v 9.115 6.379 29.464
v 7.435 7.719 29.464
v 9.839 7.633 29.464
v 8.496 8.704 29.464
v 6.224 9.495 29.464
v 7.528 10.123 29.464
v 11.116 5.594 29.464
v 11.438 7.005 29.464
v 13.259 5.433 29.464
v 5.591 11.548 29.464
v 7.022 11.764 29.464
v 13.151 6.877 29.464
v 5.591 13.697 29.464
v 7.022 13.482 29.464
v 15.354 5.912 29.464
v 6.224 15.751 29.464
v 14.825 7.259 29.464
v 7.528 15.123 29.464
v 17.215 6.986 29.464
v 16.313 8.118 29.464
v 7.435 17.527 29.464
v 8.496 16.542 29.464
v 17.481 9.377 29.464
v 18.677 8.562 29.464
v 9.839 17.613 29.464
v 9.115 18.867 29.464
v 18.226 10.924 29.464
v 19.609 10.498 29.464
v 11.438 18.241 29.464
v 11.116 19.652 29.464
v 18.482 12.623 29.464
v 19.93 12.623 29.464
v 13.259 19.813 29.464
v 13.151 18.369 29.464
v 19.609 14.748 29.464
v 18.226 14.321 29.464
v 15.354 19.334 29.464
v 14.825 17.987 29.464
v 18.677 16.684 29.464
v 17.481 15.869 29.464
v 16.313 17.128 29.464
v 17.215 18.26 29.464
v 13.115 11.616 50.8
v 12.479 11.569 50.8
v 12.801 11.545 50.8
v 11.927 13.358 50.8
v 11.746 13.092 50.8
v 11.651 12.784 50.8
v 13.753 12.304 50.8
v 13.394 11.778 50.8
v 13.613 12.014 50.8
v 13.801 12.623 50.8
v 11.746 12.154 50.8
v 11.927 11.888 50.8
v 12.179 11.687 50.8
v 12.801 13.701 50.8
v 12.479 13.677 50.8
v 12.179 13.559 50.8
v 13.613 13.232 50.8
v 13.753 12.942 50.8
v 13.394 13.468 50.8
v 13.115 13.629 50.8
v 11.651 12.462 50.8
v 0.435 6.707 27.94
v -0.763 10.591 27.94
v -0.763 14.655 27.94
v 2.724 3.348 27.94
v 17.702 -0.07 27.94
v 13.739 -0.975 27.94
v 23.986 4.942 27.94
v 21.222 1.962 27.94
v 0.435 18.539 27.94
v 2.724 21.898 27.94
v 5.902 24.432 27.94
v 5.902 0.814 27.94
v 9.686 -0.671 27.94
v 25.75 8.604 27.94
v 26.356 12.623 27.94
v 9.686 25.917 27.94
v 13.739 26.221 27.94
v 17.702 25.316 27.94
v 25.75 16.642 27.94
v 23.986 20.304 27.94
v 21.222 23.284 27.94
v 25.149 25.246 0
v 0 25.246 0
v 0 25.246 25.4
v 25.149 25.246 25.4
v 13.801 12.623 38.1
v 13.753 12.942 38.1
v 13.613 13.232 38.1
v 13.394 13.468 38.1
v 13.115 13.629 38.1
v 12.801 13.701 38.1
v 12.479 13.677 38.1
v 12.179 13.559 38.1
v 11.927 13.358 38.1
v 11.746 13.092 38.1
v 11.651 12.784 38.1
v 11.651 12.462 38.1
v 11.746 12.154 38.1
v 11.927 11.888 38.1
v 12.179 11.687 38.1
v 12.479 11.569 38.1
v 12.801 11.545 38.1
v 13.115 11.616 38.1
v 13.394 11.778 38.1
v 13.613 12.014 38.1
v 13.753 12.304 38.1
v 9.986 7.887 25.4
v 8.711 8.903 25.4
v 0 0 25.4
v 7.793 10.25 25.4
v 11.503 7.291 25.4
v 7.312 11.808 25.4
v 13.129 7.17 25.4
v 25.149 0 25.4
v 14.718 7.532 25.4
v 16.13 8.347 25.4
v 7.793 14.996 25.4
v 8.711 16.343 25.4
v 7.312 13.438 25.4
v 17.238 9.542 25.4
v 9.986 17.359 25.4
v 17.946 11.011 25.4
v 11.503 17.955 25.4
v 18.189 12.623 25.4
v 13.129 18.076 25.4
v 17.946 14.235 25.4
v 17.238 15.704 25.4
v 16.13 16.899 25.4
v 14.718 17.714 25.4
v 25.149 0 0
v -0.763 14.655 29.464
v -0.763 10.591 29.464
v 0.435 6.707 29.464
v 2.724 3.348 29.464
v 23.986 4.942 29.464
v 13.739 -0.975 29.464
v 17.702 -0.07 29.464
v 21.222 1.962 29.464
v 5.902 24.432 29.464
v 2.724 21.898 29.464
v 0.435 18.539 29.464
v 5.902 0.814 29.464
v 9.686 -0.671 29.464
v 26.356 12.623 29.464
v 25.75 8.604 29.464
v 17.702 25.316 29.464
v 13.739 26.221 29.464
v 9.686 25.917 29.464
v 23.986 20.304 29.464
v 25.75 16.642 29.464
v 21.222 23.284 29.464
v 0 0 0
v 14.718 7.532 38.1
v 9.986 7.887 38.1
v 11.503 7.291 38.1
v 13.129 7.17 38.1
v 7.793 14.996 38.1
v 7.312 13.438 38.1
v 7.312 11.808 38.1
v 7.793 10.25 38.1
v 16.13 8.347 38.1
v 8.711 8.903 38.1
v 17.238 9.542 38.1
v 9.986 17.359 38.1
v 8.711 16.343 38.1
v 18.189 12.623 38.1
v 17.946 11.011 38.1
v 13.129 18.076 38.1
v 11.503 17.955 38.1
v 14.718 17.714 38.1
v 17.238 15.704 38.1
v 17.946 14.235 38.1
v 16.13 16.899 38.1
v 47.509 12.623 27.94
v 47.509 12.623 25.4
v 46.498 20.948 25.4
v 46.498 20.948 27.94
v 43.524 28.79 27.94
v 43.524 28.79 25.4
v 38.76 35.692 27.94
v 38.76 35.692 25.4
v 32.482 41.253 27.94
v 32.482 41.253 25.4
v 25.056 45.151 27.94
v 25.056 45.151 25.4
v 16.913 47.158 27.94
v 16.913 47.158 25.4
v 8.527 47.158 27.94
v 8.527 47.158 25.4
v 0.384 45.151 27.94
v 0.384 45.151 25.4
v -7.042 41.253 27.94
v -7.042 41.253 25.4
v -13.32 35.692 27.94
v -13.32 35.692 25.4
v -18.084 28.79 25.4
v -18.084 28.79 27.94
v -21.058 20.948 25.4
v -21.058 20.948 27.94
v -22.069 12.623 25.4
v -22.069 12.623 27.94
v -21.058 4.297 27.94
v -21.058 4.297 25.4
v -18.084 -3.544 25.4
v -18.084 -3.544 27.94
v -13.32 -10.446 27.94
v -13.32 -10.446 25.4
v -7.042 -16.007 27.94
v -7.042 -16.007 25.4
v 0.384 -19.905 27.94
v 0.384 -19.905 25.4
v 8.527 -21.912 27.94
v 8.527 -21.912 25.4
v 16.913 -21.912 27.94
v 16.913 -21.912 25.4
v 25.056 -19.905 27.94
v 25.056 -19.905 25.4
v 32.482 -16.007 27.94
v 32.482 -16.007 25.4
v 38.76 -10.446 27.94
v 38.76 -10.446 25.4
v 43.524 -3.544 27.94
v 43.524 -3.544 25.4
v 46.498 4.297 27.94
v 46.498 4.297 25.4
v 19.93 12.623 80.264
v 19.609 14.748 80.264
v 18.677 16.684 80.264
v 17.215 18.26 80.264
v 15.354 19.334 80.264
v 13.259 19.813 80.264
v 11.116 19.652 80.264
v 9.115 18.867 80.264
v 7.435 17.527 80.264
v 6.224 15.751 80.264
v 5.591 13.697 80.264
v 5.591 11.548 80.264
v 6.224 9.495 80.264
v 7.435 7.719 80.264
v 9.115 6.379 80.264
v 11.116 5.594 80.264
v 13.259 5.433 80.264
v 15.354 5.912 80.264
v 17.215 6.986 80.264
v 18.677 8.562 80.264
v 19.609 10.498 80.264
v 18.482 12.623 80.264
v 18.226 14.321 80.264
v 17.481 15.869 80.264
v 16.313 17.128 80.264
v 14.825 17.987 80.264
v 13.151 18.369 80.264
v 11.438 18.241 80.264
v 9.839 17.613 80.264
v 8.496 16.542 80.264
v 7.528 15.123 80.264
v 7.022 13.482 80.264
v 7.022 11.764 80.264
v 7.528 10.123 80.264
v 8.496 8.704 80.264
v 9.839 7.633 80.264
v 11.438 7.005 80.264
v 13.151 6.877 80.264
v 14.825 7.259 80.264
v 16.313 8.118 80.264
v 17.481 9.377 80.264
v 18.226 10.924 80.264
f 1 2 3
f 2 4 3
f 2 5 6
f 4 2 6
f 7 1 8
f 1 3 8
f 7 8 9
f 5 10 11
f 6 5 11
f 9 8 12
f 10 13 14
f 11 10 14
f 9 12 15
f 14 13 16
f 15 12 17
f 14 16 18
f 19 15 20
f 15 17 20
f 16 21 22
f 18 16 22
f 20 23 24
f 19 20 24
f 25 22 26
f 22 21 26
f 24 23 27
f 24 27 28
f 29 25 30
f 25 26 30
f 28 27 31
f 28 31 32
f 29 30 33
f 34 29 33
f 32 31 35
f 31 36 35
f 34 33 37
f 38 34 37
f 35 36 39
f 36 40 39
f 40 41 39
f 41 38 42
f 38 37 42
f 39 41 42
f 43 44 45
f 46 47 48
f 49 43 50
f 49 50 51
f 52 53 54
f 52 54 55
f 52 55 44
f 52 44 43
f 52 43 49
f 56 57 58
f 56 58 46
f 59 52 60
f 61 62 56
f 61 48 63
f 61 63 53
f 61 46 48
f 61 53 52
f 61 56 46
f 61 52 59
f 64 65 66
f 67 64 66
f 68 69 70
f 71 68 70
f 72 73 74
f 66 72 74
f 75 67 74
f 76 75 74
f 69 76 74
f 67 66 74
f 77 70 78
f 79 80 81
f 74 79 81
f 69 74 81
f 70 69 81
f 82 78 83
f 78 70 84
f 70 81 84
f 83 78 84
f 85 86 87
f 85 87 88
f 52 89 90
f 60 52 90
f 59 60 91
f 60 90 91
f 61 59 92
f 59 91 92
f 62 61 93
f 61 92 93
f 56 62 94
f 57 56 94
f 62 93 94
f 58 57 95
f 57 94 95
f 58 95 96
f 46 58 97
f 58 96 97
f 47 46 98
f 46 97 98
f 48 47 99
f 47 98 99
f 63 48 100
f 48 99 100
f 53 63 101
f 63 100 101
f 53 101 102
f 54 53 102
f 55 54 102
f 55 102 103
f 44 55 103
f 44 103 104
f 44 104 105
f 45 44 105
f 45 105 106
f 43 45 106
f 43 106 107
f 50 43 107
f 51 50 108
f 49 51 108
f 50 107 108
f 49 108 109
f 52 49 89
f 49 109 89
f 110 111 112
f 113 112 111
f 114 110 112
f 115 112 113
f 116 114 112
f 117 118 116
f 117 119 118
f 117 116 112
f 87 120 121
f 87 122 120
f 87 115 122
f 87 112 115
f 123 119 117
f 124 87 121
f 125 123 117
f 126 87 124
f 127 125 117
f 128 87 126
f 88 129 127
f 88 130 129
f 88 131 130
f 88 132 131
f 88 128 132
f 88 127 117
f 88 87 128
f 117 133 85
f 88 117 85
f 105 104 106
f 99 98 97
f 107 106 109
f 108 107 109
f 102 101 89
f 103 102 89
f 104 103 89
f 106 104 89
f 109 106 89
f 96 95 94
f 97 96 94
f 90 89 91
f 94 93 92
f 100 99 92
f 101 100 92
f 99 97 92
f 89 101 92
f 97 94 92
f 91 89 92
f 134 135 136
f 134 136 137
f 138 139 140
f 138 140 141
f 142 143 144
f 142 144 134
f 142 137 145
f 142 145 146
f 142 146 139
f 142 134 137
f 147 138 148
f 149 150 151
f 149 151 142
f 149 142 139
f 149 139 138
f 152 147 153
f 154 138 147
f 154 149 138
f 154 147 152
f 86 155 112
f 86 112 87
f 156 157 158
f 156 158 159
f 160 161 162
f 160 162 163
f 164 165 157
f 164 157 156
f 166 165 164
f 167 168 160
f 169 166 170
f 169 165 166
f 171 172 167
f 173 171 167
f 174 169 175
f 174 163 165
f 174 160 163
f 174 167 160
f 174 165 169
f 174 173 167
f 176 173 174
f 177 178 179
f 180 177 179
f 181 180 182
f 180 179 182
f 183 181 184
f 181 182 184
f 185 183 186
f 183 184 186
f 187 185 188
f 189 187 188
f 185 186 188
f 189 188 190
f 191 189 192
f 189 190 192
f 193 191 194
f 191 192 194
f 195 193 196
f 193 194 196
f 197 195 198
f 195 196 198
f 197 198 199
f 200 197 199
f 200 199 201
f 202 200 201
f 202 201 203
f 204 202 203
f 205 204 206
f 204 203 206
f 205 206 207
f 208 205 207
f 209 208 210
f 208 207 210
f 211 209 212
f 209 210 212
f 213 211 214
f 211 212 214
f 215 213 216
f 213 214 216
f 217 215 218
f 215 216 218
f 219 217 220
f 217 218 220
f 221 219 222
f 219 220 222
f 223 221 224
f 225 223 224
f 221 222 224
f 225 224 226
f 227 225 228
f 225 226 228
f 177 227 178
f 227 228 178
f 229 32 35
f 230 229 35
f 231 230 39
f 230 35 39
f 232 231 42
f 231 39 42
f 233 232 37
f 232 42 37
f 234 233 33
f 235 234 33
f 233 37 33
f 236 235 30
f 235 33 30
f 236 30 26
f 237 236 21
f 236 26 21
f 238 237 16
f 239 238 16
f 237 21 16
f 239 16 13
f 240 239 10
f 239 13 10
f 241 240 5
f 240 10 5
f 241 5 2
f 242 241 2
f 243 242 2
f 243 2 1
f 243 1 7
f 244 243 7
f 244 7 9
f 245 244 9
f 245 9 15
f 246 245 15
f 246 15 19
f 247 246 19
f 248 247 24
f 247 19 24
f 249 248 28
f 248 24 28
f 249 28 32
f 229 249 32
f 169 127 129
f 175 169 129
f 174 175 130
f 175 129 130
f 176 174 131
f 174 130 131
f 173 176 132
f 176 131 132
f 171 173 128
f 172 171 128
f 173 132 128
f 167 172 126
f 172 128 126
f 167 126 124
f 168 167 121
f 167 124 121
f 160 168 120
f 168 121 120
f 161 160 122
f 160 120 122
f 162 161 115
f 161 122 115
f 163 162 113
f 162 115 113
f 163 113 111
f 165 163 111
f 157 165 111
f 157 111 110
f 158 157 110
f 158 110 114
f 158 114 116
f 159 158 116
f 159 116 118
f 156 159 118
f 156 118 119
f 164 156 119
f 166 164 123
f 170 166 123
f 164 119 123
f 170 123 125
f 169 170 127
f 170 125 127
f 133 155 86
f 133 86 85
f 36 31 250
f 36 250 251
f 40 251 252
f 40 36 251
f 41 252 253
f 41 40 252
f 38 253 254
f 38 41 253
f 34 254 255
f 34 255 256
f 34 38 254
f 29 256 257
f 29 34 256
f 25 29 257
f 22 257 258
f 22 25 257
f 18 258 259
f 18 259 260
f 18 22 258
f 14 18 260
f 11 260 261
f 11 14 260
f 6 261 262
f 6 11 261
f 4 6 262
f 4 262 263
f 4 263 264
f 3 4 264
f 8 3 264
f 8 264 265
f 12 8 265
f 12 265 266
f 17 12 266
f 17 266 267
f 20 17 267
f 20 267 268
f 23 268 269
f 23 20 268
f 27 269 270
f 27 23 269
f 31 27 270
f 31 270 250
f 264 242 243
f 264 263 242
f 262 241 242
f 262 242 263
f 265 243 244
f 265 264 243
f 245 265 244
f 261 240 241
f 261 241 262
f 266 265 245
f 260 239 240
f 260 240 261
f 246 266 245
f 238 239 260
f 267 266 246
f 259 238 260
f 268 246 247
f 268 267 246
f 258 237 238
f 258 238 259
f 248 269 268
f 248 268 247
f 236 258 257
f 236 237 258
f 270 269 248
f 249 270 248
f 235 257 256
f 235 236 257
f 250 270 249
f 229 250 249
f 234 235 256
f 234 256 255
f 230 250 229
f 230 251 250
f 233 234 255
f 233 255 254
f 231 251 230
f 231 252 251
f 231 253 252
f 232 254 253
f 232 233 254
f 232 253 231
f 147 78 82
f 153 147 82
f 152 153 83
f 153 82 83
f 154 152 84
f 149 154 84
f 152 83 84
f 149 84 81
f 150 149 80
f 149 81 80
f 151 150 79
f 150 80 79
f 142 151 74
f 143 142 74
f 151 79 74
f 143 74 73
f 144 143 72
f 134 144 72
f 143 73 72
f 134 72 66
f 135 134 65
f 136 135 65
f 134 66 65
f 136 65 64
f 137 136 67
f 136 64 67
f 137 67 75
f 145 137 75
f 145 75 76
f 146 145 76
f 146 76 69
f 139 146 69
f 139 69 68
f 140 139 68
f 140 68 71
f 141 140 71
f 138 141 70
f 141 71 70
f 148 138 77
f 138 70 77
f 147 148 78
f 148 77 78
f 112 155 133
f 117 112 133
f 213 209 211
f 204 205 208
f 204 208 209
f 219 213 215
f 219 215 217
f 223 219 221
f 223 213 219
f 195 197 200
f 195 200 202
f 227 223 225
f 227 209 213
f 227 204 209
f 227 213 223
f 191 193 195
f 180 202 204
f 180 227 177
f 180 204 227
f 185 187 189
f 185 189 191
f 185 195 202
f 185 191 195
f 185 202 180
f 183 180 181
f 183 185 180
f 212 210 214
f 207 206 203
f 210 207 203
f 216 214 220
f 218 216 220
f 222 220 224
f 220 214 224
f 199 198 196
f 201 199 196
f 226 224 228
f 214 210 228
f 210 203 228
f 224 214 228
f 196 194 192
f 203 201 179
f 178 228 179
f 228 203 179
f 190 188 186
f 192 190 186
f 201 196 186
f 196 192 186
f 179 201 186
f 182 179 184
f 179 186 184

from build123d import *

# Parameters (mm, degrees)
F0_W      = 25.148775
F0_H      = 25.245873
F1_DEPTH  = 25.4
F2_R      = 5.468696
F3_DEPTH  = 12.7
F4_R      = 1.081195
F5_DEPTH  = 12.7
F6_R      = 34.788547
F7_DEPTH  = 2.54
F8_R      = 13.635781
F9_DEPTH  = 1.524
F10_R     = 7.209759
F10_R_2   = 5.762306
F11_DEPTH = 50.8


with BuildPart() as f1:
    # F0 (on Top) → F1 (new body)
    with BuildSketch(Plane.XY):
        with Locations((12.574388, 12.622936)):
            Rectangle(F0_W, F0_H)
    extrude(amount=F1_DEPTH)

    # F2 (on face) → F3 (join)
    with BuildSketch(Plane.XY.offset(25.4)):
        with Locations((12.720035, 12.622937)):
            Circle(F2_R)
    extrude(amount=F3_DEPTH)


with BuildPart() as f5:
    # F4 (on face) → F5 (new body)
    with BuildSketch(Plane.XY.offset(38.1)):
        with Locations((12.720035, 12.622937)):
            Circle(F4_R)
    extrude(amount=F5_DEPTH)


with BuildPart() as f7:
    # F6 (on face) → F7 (new body)
    with BuildSketch(Plane.XY.offset(25.4)):
        with Locations((12.720035, 12.622937)):
            Circle(F6_R)
    extrude(amount=F7_DEPTH)


with BuildPart() as f9:
    # F8 (on face) → F9 (new body)
    with BuildSketch(Plane.XY.offset(27.94)):
        with Locations((12.720035, 12.622937)):
            Circle(F8_R)
    extrude(amount=F9_DEPTH)


with BuildPart() as f11:
    # F10 (on face) → F11 (new body)
    with BuildSketch(Plane.XY.offset(29.464)):
        with Locations((12.720035, 12.622937)):
            Circle(F10_R)
        with Locations((12.720035, 12.622937)):
            Circle(F10_R_2, mode=Mode.SUBTRACT)
    extrude(amount=F11_DEPTH)


solid = Compound([f1.part, f5.part, f7.part, f9.part, f11.part])
